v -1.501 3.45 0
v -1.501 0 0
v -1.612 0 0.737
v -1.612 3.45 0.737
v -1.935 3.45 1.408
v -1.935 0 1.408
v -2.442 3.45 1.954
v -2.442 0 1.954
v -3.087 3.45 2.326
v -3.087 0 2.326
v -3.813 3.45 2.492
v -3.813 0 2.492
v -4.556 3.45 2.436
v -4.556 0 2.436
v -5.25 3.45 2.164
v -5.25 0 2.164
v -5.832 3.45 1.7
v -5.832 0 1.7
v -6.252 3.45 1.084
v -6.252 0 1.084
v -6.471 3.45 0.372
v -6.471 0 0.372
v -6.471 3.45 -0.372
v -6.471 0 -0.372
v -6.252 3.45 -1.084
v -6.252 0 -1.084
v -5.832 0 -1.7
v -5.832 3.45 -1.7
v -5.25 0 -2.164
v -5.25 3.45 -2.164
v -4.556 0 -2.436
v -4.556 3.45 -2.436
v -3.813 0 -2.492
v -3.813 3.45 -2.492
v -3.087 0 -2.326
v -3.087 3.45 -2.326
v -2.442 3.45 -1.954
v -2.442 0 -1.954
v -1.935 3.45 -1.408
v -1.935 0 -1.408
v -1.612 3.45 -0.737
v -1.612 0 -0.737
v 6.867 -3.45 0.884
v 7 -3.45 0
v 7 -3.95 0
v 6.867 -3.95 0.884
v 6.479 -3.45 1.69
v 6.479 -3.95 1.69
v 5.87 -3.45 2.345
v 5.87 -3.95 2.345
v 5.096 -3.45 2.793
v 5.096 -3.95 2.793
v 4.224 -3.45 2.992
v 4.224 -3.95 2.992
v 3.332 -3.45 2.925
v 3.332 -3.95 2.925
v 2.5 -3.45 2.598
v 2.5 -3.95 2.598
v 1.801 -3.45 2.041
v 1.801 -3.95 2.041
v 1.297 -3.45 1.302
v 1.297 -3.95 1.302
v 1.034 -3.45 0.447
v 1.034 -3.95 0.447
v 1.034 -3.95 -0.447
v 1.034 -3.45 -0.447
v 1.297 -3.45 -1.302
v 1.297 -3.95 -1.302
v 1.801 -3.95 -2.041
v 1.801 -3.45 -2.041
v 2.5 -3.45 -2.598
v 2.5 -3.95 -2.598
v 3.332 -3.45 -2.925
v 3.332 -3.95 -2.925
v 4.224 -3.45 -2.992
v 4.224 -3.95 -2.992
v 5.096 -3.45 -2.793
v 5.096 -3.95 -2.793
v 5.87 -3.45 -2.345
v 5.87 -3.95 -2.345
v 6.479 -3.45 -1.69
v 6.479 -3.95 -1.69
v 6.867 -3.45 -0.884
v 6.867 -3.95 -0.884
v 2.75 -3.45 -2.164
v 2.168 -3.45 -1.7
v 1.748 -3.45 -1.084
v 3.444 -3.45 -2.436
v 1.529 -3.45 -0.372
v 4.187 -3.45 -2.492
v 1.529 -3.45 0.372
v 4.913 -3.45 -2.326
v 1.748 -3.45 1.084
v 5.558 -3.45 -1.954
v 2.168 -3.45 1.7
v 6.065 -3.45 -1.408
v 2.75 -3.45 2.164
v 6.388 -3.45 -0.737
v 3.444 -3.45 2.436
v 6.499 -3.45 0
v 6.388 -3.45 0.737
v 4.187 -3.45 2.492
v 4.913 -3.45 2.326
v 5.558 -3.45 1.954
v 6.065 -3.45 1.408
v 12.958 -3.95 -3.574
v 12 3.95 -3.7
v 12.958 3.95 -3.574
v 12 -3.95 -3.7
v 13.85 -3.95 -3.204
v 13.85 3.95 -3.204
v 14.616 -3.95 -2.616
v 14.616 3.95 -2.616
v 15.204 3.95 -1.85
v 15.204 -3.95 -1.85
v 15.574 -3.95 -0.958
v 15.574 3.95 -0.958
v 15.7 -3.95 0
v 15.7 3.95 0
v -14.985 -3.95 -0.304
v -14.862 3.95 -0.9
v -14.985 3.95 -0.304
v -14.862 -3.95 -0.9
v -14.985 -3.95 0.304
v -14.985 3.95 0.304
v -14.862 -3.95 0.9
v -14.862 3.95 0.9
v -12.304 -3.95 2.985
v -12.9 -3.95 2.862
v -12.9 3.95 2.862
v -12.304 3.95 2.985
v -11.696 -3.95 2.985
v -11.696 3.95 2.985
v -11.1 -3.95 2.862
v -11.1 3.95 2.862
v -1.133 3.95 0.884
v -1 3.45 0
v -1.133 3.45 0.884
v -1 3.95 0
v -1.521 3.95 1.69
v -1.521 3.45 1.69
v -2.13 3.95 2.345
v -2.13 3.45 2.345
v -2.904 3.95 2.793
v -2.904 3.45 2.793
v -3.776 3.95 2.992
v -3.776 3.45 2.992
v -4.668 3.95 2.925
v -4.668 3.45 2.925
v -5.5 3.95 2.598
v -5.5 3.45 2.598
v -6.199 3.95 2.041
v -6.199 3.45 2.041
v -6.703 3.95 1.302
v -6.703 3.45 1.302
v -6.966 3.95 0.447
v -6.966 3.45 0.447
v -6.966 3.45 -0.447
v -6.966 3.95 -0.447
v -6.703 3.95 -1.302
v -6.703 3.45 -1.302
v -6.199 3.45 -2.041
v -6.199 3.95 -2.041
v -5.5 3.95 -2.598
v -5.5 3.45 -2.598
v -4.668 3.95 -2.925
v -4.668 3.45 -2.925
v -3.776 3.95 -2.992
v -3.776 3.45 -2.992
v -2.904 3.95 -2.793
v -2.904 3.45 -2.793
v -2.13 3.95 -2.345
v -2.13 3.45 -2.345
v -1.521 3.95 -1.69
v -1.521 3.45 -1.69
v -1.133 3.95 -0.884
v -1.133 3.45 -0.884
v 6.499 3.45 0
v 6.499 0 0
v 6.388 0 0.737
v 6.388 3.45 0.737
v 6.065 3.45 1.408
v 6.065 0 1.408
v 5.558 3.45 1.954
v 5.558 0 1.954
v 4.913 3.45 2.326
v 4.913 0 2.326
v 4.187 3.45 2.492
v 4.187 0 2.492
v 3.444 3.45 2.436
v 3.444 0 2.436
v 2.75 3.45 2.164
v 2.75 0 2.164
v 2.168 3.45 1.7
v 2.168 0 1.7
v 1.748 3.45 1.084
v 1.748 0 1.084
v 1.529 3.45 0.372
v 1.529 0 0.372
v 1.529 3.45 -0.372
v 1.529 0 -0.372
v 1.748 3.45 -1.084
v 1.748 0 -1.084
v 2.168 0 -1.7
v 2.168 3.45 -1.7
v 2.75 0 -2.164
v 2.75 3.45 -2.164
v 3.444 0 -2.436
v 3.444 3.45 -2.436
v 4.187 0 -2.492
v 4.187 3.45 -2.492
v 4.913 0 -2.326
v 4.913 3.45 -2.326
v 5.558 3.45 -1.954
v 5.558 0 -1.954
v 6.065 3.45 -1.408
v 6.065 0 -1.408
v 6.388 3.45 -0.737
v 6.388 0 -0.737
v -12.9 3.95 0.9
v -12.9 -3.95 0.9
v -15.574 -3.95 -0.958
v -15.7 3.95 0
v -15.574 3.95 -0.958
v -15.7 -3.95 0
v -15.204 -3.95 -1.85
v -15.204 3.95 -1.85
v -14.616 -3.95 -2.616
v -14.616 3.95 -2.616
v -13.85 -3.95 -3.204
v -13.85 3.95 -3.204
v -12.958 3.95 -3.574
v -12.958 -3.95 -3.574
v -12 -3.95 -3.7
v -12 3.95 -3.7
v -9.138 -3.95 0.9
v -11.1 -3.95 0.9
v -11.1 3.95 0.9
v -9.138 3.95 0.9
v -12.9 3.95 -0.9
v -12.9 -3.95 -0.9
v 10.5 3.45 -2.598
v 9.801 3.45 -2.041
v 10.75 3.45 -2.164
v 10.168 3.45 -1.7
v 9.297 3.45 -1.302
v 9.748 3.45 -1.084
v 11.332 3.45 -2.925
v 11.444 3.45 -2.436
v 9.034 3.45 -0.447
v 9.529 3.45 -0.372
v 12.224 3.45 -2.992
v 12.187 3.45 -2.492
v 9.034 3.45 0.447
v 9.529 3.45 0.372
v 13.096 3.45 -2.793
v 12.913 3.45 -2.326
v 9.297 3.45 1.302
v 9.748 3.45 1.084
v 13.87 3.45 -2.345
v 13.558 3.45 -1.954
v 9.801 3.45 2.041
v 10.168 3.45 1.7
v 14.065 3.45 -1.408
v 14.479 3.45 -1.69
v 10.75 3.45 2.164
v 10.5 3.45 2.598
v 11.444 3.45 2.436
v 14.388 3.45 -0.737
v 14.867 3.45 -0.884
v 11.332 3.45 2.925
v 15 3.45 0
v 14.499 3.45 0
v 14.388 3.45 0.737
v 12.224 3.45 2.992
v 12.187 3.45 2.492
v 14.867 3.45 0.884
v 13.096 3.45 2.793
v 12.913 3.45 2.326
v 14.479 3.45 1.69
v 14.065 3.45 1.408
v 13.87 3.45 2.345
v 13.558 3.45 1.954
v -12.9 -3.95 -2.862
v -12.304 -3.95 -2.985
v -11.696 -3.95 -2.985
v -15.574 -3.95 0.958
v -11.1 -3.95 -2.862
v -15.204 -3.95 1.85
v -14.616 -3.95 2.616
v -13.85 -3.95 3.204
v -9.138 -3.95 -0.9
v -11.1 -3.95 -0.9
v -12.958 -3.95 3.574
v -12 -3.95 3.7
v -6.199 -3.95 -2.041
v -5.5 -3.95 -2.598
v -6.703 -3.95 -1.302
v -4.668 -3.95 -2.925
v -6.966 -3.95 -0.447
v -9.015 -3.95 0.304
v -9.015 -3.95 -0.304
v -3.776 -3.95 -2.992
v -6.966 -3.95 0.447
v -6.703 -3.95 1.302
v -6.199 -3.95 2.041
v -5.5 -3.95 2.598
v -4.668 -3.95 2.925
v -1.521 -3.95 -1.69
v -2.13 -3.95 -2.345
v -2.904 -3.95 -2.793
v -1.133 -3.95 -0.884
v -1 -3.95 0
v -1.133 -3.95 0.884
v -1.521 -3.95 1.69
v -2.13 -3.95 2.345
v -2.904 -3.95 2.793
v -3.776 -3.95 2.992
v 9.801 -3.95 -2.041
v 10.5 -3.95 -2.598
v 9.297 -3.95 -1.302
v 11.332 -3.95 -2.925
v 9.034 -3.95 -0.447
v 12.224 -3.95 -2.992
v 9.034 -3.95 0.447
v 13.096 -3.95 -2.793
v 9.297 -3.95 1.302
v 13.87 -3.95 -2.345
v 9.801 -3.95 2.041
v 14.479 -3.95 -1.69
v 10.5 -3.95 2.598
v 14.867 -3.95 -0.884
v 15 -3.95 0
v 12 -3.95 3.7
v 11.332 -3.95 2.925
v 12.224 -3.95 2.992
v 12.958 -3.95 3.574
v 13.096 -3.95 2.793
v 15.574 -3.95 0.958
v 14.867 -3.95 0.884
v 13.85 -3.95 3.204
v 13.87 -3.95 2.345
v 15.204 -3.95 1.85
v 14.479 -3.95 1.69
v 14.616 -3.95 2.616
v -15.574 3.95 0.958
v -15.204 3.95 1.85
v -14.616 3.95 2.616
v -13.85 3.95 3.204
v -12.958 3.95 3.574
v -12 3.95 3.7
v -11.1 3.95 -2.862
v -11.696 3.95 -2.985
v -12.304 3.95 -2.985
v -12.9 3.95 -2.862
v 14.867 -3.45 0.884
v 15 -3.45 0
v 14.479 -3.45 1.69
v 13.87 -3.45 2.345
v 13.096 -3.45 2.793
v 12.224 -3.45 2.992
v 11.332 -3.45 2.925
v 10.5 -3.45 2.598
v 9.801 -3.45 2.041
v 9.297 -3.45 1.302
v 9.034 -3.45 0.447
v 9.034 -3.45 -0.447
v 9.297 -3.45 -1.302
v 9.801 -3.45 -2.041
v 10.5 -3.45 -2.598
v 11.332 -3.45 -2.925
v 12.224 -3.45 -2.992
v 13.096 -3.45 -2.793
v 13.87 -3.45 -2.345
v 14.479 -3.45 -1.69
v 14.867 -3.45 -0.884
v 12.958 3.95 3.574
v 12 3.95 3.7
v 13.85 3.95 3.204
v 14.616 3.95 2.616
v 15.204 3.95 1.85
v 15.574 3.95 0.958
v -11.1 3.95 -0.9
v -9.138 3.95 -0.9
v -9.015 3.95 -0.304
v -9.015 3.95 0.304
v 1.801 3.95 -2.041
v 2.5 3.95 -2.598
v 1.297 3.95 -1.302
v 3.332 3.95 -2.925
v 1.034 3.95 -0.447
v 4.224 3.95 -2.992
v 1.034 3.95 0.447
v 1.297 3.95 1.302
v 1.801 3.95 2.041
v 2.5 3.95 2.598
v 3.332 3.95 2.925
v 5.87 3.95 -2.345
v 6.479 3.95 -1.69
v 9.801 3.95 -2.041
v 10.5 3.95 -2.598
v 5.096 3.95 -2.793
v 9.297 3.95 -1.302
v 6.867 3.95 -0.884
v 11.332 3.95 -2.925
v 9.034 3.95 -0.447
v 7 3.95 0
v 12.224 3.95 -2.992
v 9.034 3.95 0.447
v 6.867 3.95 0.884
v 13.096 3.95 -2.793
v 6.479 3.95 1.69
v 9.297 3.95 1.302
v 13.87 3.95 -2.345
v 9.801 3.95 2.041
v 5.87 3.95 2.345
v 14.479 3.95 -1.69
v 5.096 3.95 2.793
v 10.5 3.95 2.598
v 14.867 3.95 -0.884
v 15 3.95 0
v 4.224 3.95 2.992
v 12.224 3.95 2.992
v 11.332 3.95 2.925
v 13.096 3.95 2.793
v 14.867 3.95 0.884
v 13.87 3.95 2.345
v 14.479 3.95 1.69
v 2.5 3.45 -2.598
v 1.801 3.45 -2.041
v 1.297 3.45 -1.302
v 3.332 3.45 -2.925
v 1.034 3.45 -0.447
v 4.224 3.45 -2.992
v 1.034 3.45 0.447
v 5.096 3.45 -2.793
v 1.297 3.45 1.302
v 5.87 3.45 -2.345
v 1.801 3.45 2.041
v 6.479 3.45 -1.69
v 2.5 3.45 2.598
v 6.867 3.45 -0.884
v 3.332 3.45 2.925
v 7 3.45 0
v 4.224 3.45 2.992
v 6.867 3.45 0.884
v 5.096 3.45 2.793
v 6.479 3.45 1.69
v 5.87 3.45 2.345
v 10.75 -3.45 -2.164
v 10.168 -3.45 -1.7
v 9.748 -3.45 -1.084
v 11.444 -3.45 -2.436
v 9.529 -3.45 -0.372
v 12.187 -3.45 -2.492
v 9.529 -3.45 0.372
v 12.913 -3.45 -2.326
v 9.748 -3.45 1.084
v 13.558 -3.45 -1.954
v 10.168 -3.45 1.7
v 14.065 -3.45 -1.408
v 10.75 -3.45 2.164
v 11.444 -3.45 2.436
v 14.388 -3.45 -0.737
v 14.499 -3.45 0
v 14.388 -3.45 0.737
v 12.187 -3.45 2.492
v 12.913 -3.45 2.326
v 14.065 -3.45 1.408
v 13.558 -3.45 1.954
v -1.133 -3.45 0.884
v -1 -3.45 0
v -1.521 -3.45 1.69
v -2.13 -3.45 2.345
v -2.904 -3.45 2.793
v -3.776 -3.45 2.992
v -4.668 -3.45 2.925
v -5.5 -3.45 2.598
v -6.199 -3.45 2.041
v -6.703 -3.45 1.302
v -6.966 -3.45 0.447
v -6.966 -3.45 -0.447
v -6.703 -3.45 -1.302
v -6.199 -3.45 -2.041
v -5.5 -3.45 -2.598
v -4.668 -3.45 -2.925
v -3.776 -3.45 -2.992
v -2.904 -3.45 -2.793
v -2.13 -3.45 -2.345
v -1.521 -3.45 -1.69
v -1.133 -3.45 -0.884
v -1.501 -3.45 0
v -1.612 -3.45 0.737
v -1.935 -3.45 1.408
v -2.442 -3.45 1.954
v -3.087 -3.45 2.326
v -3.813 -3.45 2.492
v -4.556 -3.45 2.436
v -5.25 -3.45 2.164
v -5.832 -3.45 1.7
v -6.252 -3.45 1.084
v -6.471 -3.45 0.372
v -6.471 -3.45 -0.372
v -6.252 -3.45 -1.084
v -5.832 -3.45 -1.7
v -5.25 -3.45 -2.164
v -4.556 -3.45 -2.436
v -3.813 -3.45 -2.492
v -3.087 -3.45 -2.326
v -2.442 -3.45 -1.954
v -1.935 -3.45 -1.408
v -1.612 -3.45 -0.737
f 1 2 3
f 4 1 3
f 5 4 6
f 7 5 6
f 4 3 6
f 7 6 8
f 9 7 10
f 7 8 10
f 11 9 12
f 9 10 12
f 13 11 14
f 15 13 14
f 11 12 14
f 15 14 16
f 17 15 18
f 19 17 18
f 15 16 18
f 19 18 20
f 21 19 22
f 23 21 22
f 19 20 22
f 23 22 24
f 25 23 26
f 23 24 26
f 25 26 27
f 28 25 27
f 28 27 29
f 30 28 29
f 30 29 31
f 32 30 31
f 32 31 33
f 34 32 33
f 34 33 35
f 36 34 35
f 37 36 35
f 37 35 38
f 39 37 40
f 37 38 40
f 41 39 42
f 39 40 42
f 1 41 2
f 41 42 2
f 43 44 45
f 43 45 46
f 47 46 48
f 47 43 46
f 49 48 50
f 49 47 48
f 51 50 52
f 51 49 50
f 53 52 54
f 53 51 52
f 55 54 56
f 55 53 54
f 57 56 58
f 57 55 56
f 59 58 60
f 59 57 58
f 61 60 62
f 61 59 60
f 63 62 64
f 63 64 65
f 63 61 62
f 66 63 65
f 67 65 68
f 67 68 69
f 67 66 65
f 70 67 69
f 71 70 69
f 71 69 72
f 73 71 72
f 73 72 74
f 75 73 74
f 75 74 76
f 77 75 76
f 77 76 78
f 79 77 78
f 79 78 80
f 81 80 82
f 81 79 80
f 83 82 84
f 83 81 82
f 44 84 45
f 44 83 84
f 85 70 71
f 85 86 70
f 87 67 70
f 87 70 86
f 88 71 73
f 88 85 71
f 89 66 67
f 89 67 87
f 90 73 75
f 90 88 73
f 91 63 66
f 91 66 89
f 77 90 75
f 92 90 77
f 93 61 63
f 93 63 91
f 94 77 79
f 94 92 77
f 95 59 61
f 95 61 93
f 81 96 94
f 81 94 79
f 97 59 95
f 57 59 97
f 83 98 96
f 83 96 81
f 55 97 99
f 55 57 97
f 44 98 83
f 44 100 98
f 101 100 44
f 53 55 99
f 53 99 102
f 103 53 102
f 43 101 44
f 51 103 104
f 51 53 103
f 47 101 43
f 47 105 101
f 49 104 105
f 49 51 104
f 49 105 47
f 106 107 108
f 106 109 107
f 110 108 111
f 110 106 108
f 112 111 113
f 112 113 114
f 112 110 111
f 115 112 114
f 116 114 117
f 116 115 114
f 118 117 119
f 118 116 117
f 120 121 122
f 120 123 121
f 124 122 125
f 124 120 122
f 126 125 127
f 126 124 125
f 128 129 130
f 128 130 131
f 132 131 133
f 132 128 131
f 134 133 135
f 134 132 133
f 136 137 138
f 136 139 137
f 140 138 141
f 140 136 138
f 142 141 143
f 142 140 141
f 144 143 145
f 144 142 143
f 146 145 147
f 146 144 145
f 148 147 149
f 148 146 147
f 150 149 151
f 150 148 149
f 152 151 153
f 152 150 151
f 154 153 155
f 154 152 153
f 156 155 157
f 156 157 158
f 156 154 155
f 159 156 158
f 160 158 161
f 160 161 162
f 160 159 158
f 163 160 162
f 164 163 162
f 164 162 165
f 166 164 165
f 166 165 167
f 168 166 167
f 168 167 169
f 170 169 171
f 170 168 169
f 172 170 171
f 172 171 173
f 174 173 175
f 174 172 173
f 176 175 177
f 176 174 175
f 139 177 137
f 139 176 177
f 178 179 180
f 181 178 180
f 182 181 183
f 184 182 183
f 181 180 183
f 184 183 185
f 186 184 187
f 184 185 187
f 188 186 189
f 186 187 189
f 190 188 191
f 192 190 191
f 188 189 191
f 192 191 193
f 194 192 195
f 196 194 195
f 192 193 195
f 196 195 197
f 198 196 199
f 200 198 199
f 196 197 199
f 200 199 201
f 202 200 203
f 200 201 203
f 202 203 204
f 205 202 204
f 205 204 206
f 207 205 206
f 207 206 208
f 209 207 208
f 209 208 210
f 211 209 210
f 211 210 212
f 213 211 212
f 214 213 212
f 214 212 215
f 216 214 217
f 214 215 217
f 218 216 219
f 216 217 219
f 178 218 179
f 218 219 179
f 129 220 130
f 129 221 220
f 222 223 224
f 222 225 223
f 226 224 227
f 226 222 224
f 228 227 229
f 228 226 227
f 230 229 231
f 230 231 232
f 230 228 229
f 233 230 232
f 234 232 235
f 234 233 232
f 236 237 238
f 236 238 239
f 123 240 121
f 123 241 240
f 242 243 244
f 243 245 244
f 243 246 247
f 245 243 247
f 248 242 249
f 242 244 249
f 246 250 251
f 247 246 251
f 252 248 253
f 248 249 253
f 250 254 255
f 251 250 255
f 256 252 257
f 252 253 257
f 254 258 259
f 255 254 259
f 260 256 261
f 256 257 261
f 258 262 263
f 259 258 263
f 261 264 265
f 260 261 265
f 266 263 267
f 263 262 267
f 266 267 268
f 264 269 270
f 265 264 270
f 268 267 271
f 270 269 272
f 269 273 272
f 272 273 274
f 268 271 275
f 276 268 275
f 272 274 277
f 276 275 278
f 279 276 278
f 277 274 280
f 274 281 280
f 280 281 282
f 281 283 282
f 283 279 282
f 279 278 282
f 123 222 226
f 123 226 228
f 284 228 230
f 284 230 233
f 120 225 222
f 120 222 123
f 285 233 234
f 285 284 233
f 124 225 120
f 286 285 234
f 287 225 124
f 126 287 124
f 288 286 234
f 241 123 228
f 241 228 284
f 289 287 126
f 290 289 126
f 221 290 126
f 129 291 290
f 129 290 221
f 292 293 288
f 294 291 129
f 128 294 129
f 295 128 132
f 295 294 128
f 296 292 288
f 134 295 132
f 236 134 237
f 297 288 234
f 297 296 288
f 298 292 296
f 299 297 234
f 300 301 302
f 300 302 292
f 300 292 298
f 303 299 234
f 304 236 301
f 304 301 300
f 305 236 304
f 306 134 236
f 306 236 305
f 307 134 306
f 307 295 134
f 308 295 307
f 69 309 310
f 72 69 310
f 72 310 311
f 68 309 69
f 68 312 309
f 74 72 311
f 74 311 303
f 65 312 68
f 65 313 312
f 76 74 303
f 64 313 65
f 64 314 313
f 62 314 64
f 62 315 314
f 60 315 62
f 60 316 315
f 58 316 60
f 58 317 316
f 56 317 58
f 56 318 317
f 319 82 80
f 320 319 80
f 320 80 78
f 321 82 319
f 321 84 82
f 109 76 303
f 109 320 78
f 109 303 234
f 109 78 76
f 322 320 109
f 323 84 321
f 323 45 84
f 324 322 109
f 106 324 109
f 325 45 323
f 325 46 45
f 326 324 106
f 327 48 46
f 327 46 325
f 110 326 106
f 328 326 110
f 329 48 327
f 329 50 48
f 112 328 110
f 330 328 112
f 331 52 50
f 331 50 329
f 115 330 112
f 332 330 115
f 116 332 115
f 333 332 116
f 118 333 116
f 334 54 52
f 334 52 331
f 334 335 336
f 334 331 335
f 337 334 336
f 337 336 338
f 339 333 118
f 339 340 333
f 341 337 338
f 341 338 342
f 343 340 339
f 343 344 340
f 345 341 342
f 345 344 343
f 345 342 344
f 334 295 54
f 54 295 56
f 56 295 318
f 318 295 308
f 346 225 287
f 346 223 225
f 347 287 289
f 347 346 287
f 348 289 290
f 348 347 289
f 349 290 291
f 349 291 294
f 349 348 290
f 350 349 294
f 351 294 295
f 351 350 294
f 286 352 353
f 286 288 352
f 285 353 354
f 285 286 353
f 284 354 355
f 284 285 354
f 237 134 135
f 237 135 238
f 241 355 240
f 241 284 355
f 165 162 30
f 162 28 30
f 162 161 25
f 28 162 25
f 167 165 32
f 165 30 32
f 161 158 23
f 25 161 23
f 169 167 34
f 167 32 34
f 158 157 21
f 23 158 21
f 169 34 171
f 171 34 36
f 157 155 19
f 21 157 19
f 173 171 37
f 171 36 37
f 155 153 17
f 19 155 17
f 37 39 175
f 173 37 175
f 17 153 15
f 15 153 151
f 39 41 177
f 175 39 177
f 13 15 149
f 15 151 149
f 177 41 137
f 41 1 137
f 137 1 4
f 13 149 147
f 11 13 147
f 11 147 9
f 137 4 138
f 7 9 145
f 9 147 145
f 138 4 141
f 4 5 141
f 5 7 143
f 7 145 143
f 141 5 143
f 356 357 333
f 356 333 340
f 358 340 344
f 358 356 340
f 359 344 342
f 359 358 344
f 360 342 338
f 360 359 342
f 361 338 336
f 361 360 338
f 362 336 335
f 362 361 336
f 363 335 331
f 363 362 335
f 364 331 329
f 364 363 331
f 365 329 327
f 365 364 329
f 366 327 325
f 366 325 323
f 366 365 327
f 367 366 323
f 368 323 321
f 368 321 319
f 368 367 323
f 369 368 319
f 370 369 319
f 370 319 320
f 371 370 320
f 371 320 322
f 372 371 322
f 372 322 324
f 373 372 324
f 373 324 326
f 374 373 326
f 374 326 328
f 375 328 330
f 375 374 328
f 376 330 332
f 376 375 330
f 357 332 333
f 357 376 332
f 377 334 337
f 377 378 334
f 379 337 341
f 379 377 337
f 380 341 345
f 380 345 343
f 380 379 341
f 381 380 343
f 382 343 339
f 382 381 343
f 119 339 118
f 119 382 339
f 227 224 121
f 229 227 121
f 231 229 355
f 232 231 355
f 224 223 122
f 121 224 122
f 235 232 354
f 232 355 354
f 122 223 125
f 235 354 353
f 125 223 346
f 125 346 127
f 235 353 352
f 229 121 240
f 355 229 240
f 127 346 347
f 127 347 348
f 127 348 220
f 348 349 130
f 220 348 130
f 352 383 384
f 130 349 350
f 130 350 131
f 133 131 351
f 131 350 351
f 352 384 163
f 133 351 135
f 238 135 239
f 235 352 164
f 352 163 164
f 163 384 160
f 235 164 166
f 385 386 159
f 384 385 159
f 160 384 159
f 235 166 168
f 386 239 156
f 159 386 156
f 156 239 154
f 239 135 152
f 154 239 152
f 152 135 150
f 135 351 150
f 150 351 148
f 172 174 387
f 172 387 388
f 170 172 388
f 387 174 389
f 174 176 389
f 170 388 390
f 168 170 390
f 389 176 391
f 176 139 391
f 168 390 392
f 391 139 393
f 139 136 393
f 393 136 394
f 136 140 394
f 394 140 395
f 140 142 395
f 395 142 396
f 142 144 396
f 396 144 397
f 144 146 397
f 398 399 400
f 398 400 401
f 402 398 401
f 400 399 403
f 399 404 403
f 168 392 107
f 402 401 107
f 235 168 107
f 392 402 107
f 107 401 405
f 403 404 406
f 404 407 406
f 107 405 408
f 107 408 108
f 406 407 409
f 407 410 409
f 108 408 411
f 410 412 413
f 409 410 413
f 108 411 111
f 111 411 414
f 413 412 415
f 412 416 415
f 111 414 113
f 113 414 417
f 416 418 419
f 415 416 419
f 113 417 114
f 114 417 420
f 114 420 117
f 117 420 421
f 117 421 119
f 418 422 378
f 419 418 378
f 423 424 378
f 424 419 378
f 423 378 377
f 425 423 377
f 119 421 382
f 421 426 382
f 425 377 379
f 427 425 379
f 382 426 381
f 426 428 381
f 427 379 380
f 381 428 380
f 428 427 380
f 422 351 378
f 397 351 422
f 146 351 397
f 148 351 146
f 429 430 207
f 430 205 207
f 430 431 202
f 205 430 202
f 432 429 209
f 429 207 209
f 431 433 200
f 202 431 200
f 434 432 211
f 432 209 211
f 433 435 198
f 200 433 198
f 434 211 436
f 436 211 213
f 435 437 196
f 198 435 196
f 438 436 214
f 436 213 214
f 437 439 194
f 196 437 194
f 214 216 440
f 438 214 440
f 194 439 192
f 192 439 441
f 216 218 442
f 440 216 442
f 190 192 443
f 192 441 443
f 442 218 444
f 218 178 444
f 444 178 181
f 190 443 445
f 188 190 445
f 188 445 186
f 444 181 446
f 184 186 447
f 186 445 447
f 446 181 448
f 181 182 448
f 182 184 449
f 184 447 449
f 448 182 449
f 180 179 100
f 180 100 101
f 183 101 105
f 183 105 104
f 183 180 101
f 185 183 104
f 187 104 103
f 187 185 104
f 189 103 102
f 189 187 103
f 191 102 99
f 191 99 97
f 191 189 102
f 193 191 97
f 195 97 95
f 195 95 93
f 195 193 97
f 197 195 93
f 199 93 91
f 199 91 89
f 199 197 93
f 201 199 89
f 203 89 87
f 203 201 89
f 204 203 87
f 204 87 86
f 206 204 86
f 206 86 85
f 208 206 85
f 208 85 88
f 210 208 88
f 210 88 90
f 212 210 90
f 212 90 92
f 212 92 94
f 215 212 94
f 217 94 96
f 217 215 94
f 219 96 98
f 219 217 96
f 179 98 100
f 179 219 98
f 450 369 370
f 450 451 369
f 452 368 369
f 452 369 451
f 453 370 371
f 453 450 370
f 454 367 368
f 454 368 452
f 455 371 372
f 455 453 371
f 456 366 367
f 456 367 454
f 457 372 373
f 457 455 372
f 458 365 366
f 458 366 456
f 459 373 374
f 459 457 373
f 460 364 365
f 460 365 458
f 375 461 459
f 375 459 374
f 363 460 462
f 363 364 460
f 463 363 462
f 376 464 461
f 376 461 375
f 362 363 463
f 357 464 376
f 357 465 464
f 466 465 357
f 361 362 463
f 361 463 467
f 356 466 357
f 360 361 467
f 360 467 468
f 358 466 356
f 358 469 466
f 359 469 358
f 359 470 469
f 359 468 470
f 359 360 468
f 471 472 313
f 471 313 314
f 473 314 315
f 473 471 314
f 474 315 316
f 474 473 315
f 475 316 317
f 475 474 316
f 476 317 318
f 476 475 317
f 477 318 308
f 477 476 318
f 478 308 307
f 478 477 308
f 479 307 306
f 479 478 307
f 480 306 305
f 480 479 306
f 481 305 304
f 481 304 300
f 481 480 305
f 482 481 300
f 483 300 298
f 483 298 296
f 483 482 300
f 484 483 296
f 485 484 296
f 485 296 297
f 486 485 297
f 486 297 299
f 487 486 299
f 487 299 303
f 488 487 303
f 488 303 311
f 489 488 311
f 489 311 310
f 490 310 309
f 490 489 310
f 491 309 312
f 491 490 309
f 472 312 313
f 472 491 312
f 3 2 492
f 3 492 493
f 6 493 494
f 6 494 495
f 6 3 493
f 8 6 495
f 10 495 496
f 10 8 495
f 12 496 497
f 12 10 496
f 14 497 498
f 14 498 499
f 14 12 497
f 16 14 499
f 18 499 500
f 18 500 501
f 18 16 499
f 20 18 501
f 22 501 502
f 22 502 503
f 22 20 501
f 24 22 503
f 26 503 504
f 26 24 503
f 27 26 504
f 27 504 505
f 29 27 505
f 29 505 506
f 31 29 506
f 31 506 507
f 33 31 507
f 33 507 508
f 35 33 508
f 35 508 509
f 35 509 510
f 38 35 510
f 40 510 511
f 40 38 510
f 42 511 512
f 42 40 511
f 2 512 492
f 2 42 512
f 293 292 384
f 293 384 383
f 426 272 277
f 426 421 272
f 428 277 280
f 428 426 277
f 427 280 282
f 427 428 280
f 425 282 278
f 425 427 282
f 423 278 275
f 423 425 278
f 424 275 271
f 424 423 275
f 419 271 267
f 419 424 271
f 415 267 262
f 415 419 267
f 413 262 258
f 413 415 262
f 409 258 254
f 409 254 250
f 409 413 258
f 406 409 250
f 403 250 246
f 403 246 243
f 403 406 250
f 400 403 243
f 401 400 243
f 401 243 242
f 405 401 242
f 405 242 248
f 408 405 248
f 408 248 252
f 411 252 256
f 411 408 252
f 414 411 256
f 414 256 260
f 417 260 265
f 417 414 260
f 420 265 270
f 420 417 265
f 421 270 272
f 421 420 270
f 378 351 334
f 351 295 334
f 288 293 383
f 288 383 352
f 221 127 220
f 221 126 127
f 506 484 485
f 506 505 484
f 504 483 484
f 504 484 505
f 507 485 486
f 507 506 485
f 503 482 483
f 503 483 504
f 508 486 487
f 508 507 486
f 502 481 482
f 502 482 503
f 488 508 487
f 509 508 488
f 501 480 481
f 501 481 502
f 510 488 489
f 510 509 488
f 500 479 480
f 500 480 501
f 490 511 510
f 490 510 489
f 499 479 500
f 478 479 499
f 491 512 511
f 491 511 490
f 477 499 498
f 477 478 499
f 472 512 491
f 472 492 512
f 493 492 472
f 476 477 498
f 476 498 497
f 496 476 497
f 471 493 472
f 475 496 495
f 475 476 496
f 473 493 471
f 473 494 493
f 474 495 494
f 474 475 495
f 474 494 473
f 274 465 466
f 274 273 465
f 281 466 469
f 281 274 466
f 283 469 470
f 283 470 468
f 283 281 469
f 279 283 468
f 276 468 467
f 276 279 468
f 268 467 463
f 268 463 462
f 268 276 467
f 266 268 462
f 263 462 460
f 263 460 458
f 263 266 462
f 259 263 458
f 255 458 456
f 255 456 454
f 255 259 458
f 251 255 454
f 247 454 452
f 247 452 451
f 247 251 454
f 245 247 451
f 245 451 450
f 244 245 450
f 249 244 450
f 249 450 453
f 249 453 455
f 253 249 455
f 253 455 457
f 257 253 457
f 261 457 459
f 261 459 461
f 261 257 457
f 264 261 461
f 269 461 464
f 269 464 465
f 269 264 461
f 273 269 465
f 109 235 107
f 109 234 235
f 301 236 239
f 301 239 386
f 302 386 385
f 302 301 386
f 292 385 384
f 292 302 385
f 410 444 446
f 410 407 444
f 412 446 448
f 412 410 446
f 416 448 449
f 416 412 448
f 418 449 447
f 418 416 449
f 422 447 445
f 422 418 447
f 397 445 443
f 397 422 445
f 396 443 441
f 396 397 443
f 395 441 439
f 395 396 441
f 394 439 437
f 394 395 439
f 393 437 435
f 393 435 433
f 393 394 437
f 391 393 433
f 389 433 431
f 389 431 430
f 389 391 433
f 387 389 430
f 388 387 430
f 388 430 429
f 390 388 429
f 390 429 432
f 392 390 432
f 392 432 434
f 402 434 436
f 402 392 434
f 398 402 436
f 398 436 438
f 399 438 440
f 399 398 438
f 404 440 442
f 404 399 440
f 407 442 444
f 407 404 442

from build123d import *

# Parameters (mm, degrees)
F0_W     = 31.4
F0_H     = 7.4
F0_R     = 3
F1_DEPTH = 3.95
F0_R_2   = 2.499
F2_DEPTH = 3.45
F3_R     = 3.69999


# Not quite as in the source:
# - a fillet or chamfer is up to 0.001 mm smaller than in the source, because OpenCascade refuses the exact size


with BuildPart() as f1:
    # F0 (on Front) → F1 (new body, symmetric)
    with BuildSketch(Plane.XZ):
        Rectangle(F0_W, F0_H)
        with BuildLine():
            ThreePointArc((-12.9, 2.8618176043), (-12, 3), (-11.1, 2.8618176043))
            Line((-11.1, 2.8618176043), (-11.1, 0.9))
            Line((-11.1, 0.9), (-9.1381823957, 0.9))
            ThreePointArc((-9.1381823957, 0.9), (-9, 0), (-9.1381823957, -0.9))
            Line((-9.1381823957, -0.9), (-11.1, -0.9))
            Line((-11.1, -0.9), (-11.1, -2.8618176043))
            ThreePointArc((-11.1, -2.8618176043), (-12, -3), (-12.9, -2.8618176043))
            Line((-12.9, -2.8618176043), (-12.9, -0.9))
            Line((-12.9, -0.9), (-14.8618176043, -0.9))
            ThreePointArc((-14.8618176043, -0.9), (-15, 0), (-14.8618176043, 0.9))
            Line((-14.8618176043, 0.9), (-12.9, 0.9))
            Line((-12.9, 0.9), (-12.9, 2.8618176043))
        make_face(mode=Mode.SUBTRACT)
        with Locations((-4, 0)):
            Circle(F0_R, mode=Mode.SUBTRACT)
        with Locations((4, 0)):
            Circle(F0_R, mode=Mode.SUBTRACT)
        with Locations((12, 0)):
            Circle(F0_R, mode=Mode.SUBTRACT)
    extrude(amount=F1_DEPTH, both=True)

    # F0 (on Front) → F2 (join, symmetric)
    with BuildSketch(Plane.XZ):
        with Locations((-4, 0)):
            Circle(F0_R)
        with Locations((-4, 0)):
            Circle(F0_R_2, mode=Mode.SUBTRACT)
        with Locations((4, 0)):
            Circle(F0_R)
        with Locations((4, 0)):
            Circle(F0_R_2, mode=Mode.SUBTRACT)
        with Locations((12, 0)):
            Circle(F0_R)
        with Locations((12, 0)):
            Circle(F0_R_2, mode=Mode.SUBTRACT)
    extrude(amount=F2_DEPTH, both=True)

    # F3 (radius 3.7 in the source; OpenCascade refuses exactly that, so slightly less here)
    f3_edges = [f1.edges().sort_by_distance(p)[0] for p in [
        (-15.7, 0, 3.7),
        (-15.7, 0, -3.7),
        (15.7, 0, 3.7),
        (15.7, 0, -3.7),
    ]]
    fillet(f3_edges, radius=F3_R)


solid = f1.part
